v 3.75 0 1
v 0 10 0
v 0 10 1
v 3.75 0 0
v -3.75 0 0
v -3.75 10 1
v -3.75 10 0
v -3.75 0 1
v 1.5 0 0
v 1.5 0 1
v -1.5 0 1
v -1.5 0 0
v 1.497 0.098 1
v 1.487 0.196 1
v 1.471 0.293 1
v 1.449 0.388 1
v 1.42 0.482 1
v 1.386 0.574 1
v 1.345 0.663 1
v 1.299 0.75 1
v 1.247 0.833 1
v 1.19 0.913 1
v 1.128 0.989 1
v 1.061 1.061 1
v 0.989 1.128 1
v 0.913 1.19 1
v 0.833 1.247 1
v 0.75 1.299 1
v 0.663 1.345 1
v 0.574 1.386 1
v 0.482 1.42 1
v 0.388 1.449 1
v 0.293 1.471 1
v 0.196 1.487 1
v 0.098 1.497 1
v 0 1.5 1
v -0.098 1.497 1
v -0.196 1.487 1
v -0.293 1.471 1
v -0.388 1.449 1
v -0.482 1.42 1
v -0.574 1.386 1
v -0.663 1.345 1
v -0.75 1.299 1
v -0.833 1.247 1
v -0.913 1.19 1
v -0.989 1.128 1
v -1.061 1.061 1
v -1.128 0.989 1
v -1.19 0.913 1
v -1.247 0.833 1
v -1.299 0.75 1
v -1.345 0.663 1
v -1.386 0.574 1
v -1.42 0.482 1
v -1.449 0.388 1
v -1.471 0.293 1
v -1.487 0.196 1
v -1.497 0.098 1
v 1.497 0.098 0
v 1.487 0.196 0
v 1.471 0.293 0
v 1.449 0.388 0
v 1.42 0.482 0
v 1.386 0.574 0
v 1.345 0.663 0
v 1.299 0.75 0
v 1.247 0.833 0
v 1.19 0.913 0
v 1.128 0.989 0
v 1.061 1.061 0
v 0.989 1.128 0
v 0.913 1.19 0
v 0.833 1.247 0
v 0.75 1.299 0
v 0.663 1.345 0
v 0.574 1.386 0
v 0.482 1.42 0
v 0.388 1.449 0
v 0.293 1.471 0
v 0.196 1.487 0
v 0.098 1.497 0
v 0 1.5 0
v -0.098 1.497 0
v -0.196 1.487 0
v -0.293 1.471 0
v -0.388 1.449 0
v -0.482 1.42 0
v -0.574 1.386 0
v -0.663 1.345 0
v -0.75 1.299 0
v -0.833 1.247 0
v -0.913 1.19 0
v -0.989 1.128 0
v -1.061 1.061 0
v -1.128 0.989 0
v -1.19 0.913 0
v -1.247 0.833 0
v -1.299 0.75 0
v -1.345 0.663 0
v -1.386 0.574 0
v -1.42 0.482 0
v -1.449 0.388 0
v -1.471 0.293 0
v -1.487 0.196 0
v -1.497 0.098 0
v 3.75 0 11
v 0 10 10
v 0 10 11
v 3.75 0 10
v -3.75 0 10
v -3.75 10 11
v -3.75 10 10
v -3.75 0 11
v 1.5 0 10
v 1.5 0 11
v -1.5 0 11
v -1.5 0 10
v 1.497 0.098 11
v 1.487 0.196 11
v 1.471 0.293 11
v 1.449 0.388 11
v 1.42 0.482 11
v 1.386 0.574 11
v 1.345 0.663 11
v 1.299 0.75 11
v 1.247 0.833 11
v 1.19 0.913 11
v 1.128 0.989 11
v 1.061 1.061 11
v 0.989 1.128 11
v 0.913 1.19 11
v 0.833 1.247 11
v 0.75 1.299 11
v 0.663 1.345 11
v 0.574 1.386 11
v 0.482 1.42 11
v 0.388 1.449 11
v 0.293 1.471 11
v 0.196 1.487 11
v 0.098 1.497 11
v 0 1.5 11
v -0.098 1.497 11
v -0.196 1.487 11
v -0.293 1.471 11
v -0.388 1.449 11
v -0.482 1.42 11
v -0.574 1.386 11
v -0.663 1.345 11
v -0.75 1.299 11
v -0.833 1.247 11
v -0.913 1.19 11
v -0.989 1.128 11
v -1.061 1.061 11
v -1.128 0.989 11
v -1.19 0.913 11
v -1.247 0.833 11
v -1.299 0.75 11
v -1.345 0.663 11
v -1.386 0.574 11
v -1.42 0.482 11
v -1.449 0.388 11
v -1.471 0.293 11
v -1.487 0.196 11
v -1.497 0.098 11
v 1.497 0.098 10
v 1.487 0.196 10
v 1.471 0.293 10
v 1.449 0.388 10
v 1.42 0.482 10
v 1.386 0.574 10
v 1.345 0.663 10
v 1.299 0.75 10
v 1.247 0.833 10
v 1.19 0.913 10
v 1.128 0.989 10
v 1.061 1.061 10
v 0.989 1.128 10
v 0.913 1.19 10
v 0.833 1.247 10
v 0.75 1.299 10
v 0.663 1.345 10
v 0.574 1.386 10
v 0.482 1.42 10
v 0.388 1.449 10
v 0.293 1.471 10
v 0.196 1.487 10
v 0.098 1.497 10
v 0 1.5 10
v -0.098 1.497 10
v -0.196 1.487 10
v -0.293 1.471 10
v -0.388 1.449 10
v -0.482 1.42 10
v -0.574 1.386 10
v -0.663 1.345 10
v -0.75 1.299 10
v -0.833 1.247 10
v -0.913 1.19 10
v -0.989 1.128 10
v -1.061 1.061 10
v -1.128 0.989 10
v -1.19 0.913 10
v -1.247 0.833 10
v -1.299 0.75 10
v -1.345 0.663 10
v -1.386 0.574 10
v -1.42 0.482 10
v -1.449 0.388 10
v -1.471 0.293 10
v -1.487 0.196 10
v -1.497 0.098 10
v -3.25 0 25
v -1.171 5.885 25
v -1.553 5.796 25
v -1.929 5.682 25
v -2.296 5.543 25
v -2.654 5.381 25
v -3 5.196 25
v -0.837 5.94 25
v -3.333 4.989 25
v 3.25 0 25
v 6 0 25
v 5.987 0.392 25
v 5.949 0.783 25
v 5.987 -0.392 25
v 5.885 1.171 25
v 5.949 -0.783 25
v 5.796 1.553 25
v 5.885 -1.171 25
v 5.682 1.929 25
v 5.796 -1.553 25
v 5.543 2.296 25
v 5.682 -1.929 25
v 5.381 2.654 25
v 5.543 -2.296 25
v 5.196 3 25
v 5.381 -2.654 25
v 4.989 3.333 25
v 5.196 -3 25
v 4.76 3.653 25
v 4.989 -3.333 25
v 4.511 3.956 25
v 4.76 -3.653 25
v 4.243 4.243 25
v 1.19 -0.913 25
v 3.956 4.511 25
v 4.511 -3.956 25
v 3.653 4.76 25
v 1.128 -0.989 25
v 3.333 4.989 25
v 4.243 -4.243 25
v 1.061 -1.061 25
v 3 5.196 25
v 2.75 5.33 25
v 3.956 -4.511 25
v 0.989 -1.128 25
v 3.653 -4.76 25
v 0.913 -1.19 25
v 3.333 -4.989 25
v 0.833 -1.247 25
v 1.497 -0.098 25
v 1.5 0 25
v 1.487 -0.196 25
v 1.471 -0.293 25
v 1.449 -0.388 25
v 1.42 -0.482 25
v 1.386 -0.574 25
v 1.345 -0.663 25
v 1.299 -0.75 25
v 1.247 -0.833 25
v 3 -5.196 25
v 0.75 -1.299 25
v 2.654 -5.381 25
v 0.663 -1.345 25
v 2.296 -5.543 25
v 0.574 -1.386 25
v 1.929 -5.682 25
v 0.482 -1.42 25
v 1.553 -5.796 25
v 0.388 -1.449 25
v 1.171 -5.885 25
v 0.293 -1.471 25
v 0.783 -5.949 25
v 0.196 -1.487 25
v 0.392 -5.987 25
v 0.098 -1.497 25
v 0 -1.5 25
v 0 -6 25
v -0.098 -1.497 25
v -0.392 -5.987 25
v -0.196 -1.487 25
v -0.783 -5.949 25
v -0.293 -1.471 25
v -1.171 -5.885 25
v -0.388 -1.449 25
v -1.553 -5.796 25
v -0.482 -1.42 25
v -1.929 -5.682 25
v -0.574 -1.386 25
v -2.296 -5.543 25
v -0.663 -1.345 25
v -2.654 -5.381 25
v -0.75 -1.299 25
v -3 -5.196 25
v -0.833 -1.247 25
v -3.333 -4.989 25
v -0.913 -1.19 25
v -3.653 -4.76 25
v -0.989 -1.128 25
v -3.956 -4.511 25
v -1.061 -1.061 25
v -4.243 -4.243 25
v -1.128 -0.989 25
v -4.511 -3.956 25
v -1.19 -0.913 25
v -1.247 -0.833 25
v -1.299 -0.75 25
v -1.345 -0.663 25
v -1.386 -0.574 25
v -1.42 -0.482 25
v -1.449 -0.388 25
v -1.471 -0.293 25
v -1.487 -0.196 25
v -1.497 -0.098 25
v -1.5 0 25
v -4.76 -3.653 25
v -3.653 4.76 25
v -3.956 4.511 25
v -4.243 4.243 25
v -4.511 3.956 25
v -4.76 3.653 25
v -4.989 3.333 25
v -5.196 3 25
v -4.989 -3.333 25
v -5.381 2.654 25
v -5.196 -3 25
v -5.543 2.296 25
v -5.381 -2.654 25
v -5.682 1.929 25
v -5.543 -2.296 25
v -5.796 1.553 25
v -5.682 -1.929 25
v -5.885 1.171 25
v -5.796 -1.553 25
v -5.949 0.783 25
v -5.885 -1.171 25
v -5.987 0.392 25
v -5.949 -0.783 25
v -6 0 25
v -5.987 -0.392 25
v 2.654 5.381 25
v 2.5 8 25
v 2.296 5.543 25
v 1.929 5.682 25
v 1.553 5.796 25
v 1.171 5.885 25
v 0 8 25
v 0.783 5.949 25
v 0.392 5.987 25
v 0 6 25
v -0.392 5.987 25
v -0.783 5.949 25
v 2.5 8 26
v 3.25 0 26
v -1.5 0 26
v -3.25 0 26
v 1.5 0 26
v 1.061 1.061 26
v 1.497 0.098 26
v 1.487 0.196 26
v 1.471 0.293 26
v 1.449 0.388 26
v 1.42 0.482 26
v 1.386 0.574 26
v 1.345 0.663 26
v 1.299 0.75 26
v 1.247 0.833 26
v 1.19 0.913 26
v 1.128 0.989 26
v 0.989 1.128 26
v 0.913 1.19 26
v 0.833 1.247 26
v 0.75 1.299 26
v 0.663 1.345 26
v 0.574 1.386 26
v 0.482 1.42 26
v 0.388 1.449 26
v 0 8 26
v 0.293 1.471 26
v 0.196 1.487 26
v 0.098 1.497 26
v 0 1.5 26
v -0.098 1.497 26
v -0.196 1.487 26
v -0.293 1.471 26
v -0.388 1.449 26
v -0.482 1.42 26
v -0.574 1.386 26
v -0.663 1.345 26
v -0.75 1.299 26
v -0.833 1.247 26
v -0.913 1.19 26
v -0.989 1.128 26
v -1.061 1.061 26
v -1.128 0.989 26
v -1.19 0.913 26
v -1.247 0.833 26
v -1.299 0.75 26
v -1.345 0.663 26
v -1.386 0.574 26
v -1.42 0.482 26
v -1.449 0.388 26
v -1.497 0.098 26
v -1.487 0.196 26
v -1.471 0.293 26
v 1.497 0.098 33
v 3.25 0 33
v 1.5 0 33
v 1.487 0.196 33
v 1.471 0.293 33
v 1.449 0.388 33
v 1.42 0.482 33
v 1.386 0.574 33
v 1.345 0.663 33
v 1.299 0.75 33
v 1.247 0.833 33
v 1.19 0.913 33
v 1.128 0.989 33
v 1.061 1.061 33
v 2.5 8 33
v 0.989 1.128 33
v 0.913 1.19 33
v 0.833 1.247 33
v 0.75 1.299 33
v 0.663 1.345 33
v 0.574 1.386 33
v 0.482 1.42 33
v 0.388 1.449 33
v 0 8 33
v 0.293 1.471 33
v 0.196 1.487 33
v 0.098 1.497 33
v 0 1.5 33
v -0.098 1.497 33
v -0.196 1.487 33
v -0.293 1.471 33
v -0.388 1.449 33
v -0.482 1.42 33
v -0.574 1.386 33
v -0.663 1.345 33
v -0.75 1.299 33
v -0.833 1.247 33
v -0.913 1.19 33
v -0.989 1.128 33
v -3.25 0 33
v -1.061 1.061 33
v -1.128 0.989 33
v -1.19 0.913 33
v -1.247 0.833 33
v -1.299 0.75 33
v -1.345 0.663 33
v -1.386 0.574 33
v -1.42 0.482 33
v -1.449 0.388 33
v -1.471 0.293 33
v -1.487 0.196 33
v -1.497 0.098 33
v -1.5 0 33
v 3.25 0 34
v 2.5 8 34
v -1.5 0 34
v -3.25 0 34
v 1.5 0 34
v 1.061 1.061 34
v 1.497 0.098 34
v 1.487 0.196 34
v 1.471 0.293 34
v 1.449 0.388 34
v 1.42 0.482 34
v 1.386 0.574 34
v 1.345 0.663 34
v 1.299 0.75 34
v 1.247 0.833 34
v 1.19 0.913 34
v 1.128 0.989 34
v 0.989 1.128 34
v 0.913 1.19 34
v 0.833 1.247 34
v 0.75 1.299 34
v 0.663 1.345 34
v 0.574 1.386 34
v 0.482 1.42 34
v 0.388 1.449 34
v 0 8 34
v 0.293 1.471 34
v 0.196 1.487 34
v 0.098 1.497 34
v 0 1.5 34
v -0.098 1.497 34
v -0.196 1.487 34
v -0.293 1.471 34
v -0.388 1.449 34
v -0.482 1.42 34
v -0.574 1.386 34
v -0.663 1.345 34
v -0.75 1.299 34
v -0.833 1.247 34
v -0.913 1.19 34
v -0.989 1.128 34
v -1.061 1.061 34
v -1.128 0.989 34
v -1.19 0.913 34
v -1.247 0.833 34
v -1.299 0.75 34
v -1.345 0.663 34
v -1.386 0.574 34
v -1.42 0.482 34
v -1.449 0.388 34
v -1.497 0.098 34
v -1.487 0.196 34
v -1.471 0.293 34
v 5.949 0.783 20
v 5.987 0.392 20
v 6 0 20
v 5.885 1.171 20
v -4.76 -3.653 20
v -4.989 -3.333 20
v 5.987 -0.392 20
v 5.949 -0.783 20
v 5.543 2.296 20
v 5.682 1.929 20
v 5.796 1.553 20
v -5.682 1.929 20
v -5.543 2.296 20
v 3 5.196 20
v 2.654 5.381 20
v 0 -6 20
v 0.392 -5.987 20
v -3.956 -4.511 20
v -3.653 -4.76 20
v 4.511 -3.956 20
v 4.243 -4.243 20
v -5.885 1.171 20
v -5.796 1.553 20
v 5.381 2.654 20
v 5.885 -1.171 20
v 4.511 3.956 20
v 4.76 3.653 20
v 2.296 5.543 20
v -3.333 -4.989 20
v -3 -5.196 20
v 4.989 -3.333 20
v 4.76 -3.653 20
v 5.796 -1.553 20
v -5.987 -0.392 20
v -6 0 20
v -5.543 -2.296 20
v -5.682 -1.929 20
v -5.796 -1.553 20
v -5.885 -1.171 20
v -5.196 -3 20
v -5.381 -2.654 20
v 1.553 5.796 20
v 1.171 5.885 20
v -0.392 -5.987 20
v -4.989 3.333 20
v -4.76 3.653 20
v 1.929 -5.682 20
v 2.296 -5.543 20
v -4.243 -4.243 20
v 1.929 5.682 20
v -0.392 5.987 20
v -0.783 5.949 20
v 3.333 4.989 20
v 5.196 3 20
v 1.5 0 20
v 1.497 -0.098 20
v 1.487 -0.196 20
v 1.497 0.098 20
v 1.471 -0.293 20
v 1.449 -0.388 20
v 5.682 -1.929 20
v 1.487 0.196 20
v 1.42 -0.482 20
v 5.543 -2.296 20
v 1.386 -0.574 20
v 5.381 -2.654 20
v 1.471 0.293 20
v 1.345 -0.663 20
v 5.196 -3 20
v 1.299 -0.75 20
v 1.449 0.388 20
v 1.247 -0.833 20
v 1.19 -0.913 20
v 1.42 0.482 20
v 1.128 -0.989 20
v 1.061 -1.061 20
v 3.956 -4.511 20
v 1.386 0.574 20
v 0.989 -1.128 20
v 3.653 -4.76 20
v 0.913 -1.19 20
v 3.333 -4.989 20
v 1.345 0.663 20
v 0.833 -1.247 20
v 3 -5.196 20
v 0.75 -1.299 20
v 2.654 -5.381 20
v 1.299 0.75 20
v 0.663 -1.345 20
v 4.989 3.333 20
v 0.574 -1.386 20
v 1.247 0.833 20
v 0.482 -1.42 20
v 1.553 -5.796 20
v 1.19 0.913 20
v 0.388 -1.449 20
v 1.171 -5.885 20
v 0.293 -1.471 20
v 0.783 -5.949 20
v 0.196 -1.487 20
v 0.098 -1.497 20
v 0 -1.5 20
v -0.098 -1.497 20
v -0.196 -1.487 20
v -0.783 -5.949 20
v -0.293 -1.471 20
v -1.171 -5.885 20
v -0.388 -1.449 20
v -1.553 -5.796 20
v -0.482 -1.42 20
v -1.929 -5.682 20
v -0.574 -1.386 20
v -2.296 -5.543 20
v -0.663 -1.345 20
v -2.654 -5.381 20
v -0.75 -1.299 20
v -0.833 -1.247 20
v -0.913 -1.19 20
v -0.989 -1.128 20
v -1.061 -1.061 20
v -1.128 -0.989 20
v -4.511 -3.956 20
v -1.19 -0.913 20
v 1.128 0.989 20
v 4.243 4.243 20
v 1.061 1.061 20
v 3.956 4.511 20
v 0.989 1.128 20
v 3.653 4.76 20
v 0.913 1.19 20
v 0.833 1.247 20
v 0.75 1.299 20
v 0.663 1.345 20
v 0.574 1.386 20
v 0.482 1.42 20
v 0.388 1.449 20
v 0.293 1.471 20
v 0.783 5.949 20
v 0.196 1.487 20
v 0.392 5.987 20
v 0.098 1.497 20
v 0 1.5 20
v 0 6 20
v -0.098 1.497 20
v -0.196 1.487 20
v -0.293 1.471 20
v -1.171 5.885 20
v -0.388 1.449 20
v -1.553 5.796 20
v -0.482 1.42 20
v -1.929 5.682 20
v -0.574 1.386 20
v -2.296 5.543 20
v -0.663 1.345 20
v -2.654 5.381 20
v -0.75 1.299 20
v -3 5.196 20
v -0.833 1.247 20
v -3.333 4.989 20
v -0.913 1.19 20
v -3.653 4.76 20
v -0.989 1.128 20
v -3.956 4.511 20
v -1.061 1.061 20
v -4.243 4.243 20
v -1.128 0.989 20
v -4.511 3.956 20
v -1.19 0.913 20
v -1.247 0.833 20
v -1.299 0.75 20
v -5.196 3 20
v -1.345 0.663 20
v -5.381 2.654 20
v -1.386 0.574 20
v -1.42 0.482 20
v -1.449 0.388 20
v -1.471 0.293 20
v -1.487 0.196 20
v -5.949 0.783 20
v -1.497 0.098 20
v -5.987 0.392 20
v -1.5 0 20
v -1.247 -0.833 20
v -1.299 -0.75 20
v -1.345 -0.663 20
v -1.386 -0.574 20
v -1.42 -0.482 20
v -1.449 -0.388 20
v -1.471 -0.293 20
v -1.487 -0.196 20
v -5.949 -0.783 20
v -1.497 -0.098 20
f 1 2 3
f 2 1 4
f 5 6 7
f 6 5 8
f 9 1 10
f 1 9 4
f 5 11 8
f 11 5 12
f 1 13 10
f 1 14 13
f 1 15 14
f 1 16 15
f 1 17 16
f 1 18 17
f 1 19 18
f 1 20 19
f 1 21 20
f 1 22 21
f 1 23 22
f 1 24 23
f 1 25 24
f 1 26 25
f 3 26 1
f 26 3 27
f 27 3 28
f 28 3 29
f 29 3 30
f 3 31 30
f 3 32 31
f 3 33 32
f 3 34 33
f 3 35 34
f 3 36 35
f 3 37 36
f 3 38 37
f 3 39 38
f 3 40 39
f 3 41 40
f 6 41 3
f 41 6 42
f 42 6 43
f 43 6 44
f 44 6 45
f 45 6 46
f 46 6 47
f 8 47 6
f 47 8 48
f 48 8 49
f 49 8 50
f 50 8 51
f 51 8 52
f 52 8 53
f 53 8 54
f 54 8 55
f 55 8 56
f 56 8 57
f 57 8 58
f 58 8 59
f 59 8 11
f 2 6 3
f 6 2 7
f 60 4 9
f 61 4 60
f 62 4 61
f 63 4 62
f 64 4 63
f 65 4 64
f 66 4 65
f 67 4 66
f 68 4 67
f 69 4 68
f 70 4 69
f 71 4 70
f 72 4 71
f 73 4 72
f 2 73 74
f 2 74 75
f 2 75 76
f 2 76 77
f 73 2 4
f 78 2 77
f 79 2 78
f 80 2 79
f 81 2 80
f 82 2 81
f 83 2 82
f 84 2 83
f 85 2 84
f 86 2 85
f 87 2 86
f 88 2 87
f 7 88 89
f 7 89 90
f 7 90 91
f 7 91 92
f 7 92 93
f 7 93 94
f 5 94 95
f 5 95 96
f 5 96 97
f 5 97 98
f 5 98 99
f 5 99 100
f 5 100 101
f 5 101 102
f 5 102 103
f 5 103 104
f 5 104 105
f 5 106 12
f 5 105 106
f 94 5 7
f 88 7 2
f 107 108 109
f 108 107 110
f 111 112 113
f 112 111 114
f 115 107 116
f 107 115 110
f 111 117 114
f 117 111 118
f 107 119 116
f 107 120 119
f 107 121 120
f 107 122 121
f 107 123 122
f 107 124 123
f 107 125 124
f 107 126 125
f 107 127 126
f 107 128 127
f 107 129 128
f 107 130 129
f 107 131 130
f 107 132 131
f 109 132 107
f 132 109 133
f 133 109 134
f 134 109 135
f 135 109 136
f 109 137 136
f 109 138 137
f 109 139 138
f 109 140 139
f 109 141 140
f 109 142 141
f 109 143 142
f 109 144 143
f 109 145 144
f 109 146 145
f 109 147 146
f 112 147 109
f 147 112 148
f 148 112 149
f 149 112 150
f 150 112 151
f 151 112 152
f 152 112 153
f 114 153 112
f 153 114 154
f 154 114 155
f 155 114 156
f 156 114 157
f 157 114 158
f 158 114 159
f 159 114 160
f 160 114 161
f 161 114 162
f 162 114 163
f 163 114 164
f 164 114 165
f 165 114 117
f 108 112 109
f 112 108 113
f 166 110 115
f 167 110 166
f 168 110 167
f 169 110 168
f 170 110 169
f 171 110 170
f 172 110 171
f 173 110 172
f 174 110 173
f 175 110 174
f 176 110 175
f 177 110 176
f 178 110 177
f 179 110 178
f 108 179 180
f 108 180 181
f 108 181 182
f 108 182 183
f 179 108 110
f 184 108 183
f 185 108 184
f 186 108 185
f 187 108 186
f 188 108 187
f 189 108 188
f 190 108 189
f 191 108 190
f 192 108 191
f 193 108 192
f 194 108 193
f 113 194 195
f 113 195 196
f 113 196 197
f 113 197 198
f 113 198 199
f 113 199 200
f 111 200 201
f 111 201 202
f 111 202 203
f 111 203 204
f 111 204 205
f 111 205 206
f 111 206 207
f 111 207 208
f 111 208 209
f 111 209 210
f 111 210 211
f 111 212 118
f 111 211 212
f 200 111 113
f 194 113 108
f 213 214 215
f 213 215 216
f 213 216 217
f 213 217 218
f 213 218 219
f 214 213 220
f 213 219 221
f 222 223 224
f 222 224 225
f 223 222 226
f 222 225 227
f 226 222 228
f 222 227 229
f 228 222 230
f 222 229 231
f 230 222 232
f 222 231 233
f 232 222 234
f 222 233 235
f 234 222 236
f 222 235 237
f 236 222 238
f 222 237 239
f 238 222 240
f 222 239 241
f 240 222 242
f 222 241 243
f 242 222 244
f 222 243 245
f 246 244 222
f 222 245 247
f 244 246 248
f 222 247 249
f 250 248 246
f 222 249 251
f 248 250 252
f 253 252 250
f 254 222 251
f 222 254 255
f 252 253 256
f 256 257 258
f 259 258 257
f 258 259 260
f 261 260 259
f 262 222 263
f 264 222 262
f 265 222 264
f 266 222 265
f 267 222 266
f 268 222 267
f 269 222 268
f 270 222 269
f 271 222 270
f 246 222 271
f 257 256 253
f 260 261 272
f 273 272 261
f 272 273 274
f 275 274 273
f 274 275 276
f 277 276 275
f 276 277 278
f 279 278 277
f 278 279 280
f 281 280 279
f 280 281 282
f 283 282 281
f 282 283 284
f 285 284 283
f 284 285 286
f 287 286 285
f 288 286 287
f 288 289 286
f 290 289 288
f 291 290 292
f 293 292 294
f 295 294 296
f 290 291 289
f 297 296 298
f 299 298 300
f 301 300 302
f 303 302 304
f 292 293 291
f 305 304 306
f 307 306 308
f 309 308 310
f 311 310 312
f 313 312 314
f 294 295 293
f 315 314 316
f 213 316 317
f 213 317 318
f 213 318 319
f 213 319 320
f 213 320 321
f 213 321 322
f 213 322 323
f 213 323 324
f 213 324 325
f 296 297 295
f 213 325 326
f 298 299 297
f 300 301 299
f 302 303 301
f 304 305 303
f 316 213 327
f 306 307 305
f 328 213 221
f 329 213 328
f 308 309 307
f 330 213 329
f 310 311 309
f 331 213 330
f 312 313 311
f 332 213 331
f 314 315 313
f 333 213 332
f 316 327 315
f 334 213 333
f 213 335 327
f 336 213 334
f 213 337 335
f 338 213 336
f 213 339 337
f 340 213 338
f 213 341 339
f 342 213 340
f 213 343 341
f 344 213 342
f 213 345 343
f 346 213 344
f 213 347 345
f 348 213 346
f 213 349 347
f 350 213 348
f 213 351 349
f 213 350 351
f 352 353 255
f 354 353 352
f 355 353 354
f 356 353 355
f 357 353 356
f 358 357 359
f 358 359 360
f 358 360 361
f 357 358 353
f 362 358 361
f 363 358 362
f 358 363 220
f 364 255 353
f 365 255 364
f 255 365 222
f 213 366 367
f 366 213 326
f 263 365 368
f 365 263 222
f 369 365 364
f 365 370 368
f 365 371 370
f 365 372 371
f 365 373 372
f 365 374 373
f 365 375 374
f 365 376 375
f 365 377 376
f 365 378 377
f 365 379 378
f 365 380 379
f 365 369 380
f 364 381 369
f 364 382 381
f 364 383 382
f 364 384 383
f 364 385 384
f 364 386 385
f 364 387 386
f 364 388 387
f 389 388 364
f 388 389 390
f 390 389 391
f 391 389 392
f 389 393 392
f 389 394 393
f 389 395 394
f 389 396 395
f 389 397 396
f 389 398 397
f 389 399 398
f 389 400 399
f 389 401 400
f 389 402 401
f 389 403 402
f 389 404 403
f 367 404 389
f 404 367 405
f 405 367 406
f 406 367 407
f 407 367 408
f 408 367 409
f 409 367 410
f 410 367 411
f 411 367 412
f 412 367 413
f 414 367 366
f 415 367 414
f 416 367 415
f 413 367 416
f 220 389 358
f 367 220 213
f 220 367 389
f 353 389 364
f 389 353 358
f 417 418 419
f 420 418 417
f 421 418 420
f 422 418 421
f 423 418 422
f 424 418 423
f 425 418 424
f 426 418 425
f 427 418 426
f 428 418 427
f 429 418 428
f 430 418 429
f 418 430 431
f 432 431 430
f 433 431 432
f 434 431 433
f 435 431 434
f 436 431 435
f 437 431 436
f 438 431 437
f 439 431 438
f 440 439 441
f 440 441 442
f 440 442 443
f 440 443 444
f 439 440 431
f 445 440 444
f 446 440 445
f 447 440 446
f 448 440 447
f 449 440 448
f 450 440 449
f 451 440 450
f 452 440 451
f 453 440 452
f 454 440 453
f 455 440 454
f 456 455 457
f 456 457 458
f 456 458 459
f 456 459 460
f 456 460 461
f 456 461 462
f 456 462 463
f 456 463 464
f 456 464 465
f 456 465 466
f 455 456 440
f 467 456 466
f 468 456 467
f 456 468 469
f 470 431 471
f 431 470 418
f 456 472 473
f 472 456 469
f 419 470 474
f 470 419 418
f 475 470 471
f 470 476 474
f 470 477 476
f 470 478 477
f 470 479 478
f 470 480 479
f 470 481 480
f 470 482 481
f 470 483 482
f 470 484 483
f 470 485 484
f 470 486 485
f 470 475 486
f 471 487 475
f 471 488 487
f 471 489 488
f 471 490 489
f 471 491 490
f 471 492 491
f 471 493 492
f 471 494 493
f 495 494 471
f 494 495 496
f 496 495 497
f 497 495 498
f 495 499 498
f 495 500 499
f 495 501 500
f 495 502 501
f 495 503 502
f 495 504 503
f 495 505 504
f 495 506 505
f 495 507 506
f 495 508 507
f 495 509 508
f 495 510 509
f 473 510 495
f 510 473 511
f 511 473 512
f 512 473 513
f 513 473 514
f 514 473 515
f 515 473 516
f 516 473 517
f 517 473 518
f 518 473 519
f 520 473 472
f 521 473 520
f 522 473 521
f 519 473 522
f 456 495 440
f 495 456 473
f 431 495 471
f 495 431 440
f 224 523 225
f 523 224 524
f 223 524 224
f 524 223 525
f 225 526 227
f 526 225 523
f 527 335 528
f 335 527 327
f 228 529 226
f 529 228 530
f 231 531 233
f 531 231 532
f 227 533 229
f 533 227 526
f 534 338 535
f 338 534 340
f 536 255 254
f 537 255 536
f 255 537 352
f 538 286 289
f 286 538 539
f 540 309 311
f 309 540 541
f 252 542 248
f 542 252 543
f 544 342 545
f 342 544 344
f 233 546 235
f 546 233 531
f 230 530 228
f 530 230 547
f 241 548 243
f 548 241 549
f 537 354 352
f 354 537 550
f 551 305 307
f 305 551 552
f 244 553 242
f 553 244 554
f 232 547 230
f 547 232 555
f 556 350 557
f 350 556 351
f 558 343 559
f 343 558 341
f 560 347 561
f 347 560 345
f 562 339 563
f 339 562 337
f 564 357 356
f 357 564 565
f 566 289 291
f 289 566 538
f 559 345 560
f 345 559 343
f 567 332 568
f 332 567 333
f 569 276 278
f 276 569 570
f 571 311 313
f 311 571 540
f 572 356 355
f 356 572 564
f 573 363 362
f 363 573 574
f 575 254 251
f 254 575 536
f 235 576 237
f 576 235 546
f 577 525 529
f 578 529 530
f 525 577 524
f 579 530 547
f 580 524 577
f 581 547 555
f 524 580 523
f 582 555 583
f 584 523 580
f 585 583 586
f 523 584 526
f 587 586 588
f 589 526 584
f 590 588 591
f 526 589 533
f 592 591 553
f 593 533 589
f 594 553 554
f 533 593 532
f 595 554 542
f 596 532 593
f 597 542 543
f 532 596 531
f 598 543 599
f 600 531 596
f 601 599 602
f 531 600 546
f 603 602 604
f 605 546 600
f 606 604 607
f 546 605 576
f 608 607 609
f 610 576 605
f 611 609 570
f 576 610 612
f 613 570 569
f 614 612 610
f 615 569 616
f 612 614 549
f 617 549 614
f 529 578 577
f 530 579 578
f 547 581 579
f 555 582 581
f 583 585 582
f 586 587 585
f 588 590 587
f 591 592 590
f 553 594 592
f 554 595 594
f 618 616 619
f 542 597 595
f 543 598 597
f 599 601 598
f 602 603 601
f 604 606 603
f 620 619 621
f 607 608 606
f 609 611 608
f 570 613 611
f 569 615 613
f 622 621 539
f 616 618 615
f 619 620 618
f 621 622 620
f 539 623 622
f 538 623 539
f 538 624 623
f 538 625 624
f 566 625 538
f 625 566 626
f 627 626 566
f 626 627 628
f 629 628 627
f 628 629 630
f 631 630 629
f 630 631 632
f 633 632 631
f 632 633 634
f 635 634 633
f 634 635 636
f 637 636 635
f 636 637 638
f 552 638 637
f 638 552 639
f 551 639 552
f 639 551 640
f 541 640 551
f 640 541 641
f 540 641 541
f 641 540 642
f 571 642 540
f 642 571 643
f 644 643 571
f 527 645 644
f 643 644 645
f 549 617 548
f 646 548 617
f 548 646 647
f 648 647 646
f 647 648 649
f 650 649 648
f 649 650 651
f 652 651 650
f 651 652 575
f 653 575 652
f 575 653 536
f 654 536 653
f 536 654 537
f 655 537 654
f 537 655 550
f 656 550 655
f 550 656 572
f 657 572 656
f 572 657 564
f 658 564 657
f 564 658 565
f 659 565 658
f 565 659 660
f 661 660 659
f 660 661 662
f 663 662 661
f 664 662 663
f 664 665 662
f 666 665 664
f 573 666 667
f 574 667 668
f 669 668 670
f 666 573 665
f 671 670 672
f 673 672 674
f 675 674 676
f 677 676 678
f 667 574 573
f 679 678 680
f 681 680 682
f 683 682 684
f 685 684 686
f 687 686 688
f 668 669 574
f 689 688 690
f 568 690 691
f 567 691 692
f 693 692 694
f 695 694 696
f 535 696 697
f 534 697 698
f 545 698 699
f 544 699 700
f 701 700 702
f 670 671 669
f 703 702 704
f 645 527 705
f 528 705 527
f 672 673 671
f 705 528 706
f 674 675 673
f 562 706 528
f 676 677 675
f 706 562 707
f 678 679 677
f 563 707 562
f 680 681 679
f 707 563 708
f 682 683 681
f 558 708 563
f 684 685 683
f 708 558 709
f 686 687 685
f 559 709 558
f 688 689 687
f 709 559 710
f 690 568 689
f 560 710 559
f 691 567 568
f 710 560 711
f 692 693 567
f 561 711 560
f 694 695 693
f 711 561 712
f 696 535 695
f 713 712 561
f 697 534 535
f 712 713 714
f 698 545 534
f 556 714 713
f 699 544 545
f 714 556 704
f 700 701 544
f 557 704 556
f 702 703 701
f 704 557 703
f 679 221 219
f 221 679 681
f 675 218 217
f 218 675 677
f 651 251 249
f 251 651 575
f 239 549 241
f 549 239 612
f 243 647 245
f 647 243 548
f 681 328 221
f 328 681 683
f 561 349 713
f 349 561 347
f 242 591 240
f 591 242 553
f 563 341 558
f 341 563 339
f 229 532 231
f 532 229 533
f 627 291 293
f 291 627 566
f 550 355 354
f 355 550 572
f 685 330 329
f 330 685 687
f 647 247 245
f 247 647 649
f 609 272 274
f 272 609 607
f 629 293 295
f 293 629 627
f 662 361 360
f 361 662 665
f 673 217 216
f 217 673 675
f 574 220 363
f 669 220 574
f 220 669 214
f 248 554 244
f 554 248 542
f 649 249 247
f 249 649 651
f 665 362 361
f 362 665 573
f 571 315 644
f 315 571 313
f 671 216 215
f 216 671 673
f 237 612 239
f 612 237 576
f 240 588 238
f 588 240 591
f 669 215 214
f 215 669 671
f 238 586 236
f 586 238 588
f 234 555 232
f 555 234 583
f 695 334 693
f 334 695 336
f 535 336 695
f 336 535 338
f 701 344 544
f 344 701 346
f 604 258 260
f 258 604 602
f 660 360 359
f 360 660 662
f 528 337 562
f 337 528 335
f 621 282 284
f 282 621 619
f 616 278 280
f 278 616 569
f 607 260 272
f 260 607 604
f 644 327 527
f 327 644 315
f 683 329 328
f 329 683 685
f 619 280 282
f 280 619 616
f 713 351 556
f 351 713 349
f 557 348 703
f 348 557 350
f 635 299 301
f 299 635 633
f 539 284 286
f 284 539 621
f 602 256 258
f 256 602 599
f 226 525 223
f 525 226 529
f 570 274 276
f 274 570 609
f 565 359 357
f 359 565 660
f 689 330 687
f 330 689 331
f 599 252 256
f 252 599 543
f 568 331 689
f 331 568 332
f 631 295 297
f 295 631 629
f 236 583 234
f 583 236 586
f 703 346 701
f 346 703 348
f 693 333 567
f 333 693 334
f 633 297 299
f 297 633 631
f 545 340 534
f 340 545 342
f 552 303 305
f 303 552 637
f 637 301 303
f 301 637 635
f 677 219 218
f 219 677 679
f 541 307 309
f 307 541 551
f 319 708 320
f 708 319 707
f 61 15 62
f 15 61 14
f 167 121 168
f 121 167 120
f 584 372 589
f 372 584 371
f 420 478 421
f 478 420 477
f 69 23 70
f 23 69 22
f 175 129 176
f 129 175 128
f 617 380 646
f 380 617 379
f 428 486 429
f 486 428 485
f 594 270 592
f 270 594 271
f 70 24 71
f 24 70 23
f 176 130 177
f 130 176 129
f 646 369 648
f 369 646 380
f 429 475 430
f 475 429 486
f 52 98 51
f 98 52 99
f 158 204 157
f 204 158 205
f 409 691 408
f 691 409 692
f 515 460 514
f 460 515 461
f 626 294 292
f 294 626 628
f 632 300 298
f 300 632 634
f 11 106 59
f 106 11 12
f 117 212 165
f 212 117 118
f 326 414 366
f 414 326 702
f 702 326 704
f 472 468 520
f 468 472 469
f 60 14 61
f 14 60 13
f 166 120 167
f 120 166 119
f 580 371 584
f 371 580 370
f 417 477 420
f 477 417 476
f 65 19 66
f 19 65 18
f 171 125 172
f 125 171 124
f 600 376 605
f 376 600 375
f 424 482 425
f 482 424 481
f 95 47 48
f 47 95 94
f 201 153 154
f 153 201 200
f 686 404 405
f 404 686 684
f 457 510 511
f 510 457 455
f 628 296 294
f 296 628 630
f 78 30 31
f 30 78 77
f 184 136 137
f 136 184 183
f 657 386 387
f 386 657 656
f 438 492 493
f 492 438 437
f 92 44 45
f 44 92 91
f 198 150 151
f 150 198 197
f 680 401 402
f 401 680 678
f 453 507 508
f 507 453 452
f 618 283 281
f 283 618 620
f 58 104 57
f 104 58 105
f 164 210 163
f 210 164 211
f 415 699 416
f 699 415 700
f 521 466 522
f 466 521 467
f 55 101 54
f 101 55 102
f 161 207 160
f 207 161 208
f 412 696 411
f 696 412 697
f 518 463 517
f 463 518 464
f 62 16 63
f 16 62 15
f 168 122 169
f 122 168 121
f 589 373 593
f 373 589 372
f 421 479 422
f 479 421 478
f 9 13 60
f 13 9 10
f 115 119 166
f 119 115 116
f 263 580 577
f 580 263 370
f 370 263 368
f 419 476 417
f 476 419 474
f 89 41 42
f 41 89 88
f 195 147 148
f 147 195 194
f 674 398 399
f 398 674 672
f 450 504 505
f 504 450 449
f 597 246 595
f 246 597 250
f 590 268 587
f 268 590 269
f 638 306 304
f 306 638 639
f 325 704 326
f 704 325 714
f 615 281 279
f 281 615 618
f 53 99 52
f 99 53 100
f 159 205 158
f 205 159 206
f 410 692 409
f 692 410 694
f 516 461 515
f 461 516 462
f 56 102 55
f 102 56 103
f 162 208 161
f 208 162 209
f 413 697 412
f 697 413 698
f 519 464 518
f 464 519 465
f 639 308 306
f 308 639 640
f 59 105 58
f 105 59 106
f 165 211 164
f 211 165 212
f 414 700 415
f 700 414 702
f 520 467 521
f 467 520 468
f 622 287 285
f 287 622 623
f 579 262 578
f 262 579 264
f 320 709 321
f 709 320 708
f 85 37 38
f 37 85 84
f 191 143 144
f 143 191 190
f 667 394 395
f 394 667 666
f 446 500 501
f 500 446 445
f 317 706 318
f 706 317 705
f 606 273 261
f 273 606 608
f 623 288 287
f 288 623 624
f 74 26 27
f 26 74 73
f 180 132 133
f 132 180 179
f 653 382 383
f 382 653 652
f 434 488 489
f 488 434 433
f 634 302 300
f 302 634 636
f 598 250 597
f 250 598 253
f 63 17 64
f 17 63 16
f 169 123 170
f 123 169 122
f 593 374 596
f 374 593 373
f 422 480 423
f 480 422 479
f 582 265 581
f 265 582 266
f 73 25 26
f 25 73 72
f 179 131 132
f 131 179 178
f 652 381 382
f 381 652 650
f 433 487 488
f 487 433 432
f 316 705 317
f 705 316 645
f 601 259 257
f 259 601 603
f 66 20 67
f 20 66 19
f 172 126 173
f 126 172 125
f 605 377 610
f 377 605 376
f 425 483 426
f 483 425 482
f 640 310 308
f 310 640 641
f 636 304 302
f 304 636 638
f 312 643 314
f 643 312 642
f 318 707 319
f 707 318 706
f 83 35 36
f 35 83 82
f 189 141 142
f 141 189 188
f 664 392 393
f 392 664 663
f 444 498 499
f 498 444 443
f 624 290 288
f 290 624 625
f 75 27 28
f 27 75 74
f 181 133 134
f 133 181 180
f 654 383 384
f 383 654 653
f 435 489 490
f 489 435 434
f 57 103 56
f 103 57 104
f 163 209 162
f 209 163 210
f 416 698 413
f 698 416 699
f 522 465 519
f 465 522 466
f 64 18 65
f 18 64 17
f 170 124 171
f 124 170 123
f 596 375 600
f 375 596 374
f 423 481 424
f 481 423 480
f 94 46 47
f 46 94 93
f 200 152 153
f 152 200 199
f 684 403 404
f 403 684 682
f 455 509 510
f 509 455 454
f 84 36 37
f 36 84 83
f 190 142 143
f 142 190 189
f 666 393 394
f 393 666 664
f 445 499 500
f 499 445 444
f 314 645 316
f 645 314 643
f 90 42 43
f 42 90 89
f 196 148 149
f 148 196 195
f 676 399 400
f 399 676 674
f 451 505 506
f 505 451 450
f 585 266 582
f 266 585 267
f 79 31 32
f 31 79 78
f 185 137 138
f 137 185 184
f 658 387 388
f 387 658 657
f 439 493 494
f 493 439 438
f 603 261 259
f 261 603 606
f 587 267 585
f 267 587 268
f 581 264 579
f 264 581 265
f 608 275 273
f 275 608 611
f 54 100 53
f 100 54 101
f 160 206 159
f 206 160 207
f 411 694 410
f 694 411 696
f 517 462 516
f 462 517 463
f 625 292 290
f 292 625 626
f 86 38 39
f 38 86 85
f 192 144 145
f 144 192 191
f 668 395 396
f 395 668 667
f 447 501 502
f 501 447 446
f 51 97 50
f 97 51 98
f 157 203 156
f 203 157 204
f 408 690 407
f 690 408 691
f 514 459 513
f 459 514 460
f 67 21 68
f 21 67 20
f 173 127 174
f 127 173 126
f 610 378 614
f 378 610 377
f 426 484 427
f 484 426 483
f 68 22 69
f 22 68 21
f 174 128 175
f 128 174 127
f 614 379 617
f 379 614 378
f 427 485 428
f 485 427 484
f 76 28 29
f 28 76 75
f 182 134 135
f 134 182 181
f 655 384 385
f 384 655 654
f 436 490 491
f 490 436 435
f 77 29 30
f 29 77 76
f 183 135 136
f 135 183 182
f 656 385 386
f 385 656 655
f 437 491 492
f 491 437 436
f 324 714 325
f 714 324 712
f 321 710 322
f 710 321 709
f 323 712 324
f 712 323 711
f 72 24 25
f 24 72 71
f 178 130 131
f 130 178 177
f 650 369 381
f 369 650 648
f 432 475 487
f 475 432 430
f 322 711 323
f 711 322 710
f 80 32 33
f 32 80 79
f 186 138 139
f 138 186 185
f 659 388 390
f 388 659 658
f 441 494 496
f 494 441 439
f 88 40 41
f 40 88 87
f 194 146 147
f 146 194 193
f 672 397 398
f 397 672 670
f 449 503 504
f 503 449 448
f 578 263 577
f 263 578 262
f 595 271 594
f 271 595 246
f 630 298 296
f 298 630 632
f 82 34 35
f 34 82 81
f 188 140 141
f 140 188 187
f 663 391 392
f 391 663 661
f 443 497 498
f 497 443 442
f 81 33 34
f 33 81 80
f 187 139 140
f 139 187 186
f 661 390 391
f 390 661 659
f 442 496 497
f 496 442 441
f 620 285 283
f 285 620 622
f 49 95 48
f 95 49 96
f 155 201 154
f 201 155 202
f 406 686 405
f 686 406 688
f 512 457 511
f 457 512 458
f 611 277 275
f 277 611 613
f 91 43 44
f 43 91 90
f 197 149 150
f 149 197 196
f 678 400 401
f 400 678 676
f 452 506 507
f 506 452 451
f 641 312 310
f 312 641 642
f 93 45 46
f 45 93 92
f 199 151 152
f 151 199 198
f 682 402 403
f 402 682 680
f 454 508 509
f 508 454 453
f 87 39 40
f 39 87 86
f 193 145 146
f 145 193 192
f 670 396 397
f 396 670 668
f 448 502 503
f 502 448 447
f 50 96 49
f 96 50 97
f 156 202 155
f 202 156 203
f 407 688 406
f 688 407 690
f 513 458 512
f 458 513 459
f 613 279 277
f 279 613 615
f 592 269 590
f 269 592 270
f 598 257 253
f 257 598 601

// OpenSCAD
// Hose-barb reducer: joins 8 mm ID tubing to 5 mm ID tubing
// Print orientation: standing upright along Z, centred on origin in X/Y

$fn = 96;

// ---- Dimensions (mm) ----
eps      = 0.5;         // cutter overshoot past faces
barb8_h  = 10;          // height of each 8 mm tubing barb
barb8_od_bottom = 7.5;  // outer diameter of 8 mm barb at bottom
barb8_od_top    = 9.5;  // outer diameter of 8 mm barb at top
barb5_h  = 8;           // height of each 5 mm tubing barb
barb5_od_bottom = 6.5;  // outer diameter of 5 mm barb at bottom
barb5_od_top    = 5.0;  // outer diameter of 5 mm barb at top
collar_d  = 12;         // diameter of cylindrical collar
length    = 41;         // total length of part (z = 0 to z = 41)
bore_d    = 3;          // through-bore diameter

// ---- Derived ----
barb8_step_z = 20;      // z where 8 mm barbs end and collar begins
barb5_step_z = 25;      // z where collar ends and 5 mm barbs begin

// ---- Model ----
difference() {
    union() {
        // 8 mm tubing barbs: sawtooth profile, stacked
        for (i = [0 : 1]) {
            translate([0, 0, i * barb8_h])
                linear_extrude(height = 1)
                    polygon([
                        [- barb8_od_bottom / 2, 0],
                        [ barb8_od_bottom / 2, 0],
                        [ 0, barb8_h],
                        [ - barb8_od_bottom / 2, barb8_h]
                    ]);
        }
        // collar
        translate([0, 0, barb8_step_z])
            cylinder(d = collar_d, h = 5);
        // 5 mm tubing barbs: shrinking profile, stacked
        for (i = [0 : 1]) {
            translate([0, 0, barb5_step_z + i * barb5_h])
                linear_extrude(height = 1)
                    polygon([
                        [ barb5_od_bottom / 2, 0],
                        [ - barb5_od_bottom / 2, 0],
                        [ 0, barb5_h],
                        [ - barb5_od_top / 2, barb5_h],
                        [ barb5_od_top / 2, barb5_h]
                    ]);
        }
    }
    // through-bore
    translate([0, 0, -eps])
        cylinder(d = bore_d, h = length + 2 * eps);
}
